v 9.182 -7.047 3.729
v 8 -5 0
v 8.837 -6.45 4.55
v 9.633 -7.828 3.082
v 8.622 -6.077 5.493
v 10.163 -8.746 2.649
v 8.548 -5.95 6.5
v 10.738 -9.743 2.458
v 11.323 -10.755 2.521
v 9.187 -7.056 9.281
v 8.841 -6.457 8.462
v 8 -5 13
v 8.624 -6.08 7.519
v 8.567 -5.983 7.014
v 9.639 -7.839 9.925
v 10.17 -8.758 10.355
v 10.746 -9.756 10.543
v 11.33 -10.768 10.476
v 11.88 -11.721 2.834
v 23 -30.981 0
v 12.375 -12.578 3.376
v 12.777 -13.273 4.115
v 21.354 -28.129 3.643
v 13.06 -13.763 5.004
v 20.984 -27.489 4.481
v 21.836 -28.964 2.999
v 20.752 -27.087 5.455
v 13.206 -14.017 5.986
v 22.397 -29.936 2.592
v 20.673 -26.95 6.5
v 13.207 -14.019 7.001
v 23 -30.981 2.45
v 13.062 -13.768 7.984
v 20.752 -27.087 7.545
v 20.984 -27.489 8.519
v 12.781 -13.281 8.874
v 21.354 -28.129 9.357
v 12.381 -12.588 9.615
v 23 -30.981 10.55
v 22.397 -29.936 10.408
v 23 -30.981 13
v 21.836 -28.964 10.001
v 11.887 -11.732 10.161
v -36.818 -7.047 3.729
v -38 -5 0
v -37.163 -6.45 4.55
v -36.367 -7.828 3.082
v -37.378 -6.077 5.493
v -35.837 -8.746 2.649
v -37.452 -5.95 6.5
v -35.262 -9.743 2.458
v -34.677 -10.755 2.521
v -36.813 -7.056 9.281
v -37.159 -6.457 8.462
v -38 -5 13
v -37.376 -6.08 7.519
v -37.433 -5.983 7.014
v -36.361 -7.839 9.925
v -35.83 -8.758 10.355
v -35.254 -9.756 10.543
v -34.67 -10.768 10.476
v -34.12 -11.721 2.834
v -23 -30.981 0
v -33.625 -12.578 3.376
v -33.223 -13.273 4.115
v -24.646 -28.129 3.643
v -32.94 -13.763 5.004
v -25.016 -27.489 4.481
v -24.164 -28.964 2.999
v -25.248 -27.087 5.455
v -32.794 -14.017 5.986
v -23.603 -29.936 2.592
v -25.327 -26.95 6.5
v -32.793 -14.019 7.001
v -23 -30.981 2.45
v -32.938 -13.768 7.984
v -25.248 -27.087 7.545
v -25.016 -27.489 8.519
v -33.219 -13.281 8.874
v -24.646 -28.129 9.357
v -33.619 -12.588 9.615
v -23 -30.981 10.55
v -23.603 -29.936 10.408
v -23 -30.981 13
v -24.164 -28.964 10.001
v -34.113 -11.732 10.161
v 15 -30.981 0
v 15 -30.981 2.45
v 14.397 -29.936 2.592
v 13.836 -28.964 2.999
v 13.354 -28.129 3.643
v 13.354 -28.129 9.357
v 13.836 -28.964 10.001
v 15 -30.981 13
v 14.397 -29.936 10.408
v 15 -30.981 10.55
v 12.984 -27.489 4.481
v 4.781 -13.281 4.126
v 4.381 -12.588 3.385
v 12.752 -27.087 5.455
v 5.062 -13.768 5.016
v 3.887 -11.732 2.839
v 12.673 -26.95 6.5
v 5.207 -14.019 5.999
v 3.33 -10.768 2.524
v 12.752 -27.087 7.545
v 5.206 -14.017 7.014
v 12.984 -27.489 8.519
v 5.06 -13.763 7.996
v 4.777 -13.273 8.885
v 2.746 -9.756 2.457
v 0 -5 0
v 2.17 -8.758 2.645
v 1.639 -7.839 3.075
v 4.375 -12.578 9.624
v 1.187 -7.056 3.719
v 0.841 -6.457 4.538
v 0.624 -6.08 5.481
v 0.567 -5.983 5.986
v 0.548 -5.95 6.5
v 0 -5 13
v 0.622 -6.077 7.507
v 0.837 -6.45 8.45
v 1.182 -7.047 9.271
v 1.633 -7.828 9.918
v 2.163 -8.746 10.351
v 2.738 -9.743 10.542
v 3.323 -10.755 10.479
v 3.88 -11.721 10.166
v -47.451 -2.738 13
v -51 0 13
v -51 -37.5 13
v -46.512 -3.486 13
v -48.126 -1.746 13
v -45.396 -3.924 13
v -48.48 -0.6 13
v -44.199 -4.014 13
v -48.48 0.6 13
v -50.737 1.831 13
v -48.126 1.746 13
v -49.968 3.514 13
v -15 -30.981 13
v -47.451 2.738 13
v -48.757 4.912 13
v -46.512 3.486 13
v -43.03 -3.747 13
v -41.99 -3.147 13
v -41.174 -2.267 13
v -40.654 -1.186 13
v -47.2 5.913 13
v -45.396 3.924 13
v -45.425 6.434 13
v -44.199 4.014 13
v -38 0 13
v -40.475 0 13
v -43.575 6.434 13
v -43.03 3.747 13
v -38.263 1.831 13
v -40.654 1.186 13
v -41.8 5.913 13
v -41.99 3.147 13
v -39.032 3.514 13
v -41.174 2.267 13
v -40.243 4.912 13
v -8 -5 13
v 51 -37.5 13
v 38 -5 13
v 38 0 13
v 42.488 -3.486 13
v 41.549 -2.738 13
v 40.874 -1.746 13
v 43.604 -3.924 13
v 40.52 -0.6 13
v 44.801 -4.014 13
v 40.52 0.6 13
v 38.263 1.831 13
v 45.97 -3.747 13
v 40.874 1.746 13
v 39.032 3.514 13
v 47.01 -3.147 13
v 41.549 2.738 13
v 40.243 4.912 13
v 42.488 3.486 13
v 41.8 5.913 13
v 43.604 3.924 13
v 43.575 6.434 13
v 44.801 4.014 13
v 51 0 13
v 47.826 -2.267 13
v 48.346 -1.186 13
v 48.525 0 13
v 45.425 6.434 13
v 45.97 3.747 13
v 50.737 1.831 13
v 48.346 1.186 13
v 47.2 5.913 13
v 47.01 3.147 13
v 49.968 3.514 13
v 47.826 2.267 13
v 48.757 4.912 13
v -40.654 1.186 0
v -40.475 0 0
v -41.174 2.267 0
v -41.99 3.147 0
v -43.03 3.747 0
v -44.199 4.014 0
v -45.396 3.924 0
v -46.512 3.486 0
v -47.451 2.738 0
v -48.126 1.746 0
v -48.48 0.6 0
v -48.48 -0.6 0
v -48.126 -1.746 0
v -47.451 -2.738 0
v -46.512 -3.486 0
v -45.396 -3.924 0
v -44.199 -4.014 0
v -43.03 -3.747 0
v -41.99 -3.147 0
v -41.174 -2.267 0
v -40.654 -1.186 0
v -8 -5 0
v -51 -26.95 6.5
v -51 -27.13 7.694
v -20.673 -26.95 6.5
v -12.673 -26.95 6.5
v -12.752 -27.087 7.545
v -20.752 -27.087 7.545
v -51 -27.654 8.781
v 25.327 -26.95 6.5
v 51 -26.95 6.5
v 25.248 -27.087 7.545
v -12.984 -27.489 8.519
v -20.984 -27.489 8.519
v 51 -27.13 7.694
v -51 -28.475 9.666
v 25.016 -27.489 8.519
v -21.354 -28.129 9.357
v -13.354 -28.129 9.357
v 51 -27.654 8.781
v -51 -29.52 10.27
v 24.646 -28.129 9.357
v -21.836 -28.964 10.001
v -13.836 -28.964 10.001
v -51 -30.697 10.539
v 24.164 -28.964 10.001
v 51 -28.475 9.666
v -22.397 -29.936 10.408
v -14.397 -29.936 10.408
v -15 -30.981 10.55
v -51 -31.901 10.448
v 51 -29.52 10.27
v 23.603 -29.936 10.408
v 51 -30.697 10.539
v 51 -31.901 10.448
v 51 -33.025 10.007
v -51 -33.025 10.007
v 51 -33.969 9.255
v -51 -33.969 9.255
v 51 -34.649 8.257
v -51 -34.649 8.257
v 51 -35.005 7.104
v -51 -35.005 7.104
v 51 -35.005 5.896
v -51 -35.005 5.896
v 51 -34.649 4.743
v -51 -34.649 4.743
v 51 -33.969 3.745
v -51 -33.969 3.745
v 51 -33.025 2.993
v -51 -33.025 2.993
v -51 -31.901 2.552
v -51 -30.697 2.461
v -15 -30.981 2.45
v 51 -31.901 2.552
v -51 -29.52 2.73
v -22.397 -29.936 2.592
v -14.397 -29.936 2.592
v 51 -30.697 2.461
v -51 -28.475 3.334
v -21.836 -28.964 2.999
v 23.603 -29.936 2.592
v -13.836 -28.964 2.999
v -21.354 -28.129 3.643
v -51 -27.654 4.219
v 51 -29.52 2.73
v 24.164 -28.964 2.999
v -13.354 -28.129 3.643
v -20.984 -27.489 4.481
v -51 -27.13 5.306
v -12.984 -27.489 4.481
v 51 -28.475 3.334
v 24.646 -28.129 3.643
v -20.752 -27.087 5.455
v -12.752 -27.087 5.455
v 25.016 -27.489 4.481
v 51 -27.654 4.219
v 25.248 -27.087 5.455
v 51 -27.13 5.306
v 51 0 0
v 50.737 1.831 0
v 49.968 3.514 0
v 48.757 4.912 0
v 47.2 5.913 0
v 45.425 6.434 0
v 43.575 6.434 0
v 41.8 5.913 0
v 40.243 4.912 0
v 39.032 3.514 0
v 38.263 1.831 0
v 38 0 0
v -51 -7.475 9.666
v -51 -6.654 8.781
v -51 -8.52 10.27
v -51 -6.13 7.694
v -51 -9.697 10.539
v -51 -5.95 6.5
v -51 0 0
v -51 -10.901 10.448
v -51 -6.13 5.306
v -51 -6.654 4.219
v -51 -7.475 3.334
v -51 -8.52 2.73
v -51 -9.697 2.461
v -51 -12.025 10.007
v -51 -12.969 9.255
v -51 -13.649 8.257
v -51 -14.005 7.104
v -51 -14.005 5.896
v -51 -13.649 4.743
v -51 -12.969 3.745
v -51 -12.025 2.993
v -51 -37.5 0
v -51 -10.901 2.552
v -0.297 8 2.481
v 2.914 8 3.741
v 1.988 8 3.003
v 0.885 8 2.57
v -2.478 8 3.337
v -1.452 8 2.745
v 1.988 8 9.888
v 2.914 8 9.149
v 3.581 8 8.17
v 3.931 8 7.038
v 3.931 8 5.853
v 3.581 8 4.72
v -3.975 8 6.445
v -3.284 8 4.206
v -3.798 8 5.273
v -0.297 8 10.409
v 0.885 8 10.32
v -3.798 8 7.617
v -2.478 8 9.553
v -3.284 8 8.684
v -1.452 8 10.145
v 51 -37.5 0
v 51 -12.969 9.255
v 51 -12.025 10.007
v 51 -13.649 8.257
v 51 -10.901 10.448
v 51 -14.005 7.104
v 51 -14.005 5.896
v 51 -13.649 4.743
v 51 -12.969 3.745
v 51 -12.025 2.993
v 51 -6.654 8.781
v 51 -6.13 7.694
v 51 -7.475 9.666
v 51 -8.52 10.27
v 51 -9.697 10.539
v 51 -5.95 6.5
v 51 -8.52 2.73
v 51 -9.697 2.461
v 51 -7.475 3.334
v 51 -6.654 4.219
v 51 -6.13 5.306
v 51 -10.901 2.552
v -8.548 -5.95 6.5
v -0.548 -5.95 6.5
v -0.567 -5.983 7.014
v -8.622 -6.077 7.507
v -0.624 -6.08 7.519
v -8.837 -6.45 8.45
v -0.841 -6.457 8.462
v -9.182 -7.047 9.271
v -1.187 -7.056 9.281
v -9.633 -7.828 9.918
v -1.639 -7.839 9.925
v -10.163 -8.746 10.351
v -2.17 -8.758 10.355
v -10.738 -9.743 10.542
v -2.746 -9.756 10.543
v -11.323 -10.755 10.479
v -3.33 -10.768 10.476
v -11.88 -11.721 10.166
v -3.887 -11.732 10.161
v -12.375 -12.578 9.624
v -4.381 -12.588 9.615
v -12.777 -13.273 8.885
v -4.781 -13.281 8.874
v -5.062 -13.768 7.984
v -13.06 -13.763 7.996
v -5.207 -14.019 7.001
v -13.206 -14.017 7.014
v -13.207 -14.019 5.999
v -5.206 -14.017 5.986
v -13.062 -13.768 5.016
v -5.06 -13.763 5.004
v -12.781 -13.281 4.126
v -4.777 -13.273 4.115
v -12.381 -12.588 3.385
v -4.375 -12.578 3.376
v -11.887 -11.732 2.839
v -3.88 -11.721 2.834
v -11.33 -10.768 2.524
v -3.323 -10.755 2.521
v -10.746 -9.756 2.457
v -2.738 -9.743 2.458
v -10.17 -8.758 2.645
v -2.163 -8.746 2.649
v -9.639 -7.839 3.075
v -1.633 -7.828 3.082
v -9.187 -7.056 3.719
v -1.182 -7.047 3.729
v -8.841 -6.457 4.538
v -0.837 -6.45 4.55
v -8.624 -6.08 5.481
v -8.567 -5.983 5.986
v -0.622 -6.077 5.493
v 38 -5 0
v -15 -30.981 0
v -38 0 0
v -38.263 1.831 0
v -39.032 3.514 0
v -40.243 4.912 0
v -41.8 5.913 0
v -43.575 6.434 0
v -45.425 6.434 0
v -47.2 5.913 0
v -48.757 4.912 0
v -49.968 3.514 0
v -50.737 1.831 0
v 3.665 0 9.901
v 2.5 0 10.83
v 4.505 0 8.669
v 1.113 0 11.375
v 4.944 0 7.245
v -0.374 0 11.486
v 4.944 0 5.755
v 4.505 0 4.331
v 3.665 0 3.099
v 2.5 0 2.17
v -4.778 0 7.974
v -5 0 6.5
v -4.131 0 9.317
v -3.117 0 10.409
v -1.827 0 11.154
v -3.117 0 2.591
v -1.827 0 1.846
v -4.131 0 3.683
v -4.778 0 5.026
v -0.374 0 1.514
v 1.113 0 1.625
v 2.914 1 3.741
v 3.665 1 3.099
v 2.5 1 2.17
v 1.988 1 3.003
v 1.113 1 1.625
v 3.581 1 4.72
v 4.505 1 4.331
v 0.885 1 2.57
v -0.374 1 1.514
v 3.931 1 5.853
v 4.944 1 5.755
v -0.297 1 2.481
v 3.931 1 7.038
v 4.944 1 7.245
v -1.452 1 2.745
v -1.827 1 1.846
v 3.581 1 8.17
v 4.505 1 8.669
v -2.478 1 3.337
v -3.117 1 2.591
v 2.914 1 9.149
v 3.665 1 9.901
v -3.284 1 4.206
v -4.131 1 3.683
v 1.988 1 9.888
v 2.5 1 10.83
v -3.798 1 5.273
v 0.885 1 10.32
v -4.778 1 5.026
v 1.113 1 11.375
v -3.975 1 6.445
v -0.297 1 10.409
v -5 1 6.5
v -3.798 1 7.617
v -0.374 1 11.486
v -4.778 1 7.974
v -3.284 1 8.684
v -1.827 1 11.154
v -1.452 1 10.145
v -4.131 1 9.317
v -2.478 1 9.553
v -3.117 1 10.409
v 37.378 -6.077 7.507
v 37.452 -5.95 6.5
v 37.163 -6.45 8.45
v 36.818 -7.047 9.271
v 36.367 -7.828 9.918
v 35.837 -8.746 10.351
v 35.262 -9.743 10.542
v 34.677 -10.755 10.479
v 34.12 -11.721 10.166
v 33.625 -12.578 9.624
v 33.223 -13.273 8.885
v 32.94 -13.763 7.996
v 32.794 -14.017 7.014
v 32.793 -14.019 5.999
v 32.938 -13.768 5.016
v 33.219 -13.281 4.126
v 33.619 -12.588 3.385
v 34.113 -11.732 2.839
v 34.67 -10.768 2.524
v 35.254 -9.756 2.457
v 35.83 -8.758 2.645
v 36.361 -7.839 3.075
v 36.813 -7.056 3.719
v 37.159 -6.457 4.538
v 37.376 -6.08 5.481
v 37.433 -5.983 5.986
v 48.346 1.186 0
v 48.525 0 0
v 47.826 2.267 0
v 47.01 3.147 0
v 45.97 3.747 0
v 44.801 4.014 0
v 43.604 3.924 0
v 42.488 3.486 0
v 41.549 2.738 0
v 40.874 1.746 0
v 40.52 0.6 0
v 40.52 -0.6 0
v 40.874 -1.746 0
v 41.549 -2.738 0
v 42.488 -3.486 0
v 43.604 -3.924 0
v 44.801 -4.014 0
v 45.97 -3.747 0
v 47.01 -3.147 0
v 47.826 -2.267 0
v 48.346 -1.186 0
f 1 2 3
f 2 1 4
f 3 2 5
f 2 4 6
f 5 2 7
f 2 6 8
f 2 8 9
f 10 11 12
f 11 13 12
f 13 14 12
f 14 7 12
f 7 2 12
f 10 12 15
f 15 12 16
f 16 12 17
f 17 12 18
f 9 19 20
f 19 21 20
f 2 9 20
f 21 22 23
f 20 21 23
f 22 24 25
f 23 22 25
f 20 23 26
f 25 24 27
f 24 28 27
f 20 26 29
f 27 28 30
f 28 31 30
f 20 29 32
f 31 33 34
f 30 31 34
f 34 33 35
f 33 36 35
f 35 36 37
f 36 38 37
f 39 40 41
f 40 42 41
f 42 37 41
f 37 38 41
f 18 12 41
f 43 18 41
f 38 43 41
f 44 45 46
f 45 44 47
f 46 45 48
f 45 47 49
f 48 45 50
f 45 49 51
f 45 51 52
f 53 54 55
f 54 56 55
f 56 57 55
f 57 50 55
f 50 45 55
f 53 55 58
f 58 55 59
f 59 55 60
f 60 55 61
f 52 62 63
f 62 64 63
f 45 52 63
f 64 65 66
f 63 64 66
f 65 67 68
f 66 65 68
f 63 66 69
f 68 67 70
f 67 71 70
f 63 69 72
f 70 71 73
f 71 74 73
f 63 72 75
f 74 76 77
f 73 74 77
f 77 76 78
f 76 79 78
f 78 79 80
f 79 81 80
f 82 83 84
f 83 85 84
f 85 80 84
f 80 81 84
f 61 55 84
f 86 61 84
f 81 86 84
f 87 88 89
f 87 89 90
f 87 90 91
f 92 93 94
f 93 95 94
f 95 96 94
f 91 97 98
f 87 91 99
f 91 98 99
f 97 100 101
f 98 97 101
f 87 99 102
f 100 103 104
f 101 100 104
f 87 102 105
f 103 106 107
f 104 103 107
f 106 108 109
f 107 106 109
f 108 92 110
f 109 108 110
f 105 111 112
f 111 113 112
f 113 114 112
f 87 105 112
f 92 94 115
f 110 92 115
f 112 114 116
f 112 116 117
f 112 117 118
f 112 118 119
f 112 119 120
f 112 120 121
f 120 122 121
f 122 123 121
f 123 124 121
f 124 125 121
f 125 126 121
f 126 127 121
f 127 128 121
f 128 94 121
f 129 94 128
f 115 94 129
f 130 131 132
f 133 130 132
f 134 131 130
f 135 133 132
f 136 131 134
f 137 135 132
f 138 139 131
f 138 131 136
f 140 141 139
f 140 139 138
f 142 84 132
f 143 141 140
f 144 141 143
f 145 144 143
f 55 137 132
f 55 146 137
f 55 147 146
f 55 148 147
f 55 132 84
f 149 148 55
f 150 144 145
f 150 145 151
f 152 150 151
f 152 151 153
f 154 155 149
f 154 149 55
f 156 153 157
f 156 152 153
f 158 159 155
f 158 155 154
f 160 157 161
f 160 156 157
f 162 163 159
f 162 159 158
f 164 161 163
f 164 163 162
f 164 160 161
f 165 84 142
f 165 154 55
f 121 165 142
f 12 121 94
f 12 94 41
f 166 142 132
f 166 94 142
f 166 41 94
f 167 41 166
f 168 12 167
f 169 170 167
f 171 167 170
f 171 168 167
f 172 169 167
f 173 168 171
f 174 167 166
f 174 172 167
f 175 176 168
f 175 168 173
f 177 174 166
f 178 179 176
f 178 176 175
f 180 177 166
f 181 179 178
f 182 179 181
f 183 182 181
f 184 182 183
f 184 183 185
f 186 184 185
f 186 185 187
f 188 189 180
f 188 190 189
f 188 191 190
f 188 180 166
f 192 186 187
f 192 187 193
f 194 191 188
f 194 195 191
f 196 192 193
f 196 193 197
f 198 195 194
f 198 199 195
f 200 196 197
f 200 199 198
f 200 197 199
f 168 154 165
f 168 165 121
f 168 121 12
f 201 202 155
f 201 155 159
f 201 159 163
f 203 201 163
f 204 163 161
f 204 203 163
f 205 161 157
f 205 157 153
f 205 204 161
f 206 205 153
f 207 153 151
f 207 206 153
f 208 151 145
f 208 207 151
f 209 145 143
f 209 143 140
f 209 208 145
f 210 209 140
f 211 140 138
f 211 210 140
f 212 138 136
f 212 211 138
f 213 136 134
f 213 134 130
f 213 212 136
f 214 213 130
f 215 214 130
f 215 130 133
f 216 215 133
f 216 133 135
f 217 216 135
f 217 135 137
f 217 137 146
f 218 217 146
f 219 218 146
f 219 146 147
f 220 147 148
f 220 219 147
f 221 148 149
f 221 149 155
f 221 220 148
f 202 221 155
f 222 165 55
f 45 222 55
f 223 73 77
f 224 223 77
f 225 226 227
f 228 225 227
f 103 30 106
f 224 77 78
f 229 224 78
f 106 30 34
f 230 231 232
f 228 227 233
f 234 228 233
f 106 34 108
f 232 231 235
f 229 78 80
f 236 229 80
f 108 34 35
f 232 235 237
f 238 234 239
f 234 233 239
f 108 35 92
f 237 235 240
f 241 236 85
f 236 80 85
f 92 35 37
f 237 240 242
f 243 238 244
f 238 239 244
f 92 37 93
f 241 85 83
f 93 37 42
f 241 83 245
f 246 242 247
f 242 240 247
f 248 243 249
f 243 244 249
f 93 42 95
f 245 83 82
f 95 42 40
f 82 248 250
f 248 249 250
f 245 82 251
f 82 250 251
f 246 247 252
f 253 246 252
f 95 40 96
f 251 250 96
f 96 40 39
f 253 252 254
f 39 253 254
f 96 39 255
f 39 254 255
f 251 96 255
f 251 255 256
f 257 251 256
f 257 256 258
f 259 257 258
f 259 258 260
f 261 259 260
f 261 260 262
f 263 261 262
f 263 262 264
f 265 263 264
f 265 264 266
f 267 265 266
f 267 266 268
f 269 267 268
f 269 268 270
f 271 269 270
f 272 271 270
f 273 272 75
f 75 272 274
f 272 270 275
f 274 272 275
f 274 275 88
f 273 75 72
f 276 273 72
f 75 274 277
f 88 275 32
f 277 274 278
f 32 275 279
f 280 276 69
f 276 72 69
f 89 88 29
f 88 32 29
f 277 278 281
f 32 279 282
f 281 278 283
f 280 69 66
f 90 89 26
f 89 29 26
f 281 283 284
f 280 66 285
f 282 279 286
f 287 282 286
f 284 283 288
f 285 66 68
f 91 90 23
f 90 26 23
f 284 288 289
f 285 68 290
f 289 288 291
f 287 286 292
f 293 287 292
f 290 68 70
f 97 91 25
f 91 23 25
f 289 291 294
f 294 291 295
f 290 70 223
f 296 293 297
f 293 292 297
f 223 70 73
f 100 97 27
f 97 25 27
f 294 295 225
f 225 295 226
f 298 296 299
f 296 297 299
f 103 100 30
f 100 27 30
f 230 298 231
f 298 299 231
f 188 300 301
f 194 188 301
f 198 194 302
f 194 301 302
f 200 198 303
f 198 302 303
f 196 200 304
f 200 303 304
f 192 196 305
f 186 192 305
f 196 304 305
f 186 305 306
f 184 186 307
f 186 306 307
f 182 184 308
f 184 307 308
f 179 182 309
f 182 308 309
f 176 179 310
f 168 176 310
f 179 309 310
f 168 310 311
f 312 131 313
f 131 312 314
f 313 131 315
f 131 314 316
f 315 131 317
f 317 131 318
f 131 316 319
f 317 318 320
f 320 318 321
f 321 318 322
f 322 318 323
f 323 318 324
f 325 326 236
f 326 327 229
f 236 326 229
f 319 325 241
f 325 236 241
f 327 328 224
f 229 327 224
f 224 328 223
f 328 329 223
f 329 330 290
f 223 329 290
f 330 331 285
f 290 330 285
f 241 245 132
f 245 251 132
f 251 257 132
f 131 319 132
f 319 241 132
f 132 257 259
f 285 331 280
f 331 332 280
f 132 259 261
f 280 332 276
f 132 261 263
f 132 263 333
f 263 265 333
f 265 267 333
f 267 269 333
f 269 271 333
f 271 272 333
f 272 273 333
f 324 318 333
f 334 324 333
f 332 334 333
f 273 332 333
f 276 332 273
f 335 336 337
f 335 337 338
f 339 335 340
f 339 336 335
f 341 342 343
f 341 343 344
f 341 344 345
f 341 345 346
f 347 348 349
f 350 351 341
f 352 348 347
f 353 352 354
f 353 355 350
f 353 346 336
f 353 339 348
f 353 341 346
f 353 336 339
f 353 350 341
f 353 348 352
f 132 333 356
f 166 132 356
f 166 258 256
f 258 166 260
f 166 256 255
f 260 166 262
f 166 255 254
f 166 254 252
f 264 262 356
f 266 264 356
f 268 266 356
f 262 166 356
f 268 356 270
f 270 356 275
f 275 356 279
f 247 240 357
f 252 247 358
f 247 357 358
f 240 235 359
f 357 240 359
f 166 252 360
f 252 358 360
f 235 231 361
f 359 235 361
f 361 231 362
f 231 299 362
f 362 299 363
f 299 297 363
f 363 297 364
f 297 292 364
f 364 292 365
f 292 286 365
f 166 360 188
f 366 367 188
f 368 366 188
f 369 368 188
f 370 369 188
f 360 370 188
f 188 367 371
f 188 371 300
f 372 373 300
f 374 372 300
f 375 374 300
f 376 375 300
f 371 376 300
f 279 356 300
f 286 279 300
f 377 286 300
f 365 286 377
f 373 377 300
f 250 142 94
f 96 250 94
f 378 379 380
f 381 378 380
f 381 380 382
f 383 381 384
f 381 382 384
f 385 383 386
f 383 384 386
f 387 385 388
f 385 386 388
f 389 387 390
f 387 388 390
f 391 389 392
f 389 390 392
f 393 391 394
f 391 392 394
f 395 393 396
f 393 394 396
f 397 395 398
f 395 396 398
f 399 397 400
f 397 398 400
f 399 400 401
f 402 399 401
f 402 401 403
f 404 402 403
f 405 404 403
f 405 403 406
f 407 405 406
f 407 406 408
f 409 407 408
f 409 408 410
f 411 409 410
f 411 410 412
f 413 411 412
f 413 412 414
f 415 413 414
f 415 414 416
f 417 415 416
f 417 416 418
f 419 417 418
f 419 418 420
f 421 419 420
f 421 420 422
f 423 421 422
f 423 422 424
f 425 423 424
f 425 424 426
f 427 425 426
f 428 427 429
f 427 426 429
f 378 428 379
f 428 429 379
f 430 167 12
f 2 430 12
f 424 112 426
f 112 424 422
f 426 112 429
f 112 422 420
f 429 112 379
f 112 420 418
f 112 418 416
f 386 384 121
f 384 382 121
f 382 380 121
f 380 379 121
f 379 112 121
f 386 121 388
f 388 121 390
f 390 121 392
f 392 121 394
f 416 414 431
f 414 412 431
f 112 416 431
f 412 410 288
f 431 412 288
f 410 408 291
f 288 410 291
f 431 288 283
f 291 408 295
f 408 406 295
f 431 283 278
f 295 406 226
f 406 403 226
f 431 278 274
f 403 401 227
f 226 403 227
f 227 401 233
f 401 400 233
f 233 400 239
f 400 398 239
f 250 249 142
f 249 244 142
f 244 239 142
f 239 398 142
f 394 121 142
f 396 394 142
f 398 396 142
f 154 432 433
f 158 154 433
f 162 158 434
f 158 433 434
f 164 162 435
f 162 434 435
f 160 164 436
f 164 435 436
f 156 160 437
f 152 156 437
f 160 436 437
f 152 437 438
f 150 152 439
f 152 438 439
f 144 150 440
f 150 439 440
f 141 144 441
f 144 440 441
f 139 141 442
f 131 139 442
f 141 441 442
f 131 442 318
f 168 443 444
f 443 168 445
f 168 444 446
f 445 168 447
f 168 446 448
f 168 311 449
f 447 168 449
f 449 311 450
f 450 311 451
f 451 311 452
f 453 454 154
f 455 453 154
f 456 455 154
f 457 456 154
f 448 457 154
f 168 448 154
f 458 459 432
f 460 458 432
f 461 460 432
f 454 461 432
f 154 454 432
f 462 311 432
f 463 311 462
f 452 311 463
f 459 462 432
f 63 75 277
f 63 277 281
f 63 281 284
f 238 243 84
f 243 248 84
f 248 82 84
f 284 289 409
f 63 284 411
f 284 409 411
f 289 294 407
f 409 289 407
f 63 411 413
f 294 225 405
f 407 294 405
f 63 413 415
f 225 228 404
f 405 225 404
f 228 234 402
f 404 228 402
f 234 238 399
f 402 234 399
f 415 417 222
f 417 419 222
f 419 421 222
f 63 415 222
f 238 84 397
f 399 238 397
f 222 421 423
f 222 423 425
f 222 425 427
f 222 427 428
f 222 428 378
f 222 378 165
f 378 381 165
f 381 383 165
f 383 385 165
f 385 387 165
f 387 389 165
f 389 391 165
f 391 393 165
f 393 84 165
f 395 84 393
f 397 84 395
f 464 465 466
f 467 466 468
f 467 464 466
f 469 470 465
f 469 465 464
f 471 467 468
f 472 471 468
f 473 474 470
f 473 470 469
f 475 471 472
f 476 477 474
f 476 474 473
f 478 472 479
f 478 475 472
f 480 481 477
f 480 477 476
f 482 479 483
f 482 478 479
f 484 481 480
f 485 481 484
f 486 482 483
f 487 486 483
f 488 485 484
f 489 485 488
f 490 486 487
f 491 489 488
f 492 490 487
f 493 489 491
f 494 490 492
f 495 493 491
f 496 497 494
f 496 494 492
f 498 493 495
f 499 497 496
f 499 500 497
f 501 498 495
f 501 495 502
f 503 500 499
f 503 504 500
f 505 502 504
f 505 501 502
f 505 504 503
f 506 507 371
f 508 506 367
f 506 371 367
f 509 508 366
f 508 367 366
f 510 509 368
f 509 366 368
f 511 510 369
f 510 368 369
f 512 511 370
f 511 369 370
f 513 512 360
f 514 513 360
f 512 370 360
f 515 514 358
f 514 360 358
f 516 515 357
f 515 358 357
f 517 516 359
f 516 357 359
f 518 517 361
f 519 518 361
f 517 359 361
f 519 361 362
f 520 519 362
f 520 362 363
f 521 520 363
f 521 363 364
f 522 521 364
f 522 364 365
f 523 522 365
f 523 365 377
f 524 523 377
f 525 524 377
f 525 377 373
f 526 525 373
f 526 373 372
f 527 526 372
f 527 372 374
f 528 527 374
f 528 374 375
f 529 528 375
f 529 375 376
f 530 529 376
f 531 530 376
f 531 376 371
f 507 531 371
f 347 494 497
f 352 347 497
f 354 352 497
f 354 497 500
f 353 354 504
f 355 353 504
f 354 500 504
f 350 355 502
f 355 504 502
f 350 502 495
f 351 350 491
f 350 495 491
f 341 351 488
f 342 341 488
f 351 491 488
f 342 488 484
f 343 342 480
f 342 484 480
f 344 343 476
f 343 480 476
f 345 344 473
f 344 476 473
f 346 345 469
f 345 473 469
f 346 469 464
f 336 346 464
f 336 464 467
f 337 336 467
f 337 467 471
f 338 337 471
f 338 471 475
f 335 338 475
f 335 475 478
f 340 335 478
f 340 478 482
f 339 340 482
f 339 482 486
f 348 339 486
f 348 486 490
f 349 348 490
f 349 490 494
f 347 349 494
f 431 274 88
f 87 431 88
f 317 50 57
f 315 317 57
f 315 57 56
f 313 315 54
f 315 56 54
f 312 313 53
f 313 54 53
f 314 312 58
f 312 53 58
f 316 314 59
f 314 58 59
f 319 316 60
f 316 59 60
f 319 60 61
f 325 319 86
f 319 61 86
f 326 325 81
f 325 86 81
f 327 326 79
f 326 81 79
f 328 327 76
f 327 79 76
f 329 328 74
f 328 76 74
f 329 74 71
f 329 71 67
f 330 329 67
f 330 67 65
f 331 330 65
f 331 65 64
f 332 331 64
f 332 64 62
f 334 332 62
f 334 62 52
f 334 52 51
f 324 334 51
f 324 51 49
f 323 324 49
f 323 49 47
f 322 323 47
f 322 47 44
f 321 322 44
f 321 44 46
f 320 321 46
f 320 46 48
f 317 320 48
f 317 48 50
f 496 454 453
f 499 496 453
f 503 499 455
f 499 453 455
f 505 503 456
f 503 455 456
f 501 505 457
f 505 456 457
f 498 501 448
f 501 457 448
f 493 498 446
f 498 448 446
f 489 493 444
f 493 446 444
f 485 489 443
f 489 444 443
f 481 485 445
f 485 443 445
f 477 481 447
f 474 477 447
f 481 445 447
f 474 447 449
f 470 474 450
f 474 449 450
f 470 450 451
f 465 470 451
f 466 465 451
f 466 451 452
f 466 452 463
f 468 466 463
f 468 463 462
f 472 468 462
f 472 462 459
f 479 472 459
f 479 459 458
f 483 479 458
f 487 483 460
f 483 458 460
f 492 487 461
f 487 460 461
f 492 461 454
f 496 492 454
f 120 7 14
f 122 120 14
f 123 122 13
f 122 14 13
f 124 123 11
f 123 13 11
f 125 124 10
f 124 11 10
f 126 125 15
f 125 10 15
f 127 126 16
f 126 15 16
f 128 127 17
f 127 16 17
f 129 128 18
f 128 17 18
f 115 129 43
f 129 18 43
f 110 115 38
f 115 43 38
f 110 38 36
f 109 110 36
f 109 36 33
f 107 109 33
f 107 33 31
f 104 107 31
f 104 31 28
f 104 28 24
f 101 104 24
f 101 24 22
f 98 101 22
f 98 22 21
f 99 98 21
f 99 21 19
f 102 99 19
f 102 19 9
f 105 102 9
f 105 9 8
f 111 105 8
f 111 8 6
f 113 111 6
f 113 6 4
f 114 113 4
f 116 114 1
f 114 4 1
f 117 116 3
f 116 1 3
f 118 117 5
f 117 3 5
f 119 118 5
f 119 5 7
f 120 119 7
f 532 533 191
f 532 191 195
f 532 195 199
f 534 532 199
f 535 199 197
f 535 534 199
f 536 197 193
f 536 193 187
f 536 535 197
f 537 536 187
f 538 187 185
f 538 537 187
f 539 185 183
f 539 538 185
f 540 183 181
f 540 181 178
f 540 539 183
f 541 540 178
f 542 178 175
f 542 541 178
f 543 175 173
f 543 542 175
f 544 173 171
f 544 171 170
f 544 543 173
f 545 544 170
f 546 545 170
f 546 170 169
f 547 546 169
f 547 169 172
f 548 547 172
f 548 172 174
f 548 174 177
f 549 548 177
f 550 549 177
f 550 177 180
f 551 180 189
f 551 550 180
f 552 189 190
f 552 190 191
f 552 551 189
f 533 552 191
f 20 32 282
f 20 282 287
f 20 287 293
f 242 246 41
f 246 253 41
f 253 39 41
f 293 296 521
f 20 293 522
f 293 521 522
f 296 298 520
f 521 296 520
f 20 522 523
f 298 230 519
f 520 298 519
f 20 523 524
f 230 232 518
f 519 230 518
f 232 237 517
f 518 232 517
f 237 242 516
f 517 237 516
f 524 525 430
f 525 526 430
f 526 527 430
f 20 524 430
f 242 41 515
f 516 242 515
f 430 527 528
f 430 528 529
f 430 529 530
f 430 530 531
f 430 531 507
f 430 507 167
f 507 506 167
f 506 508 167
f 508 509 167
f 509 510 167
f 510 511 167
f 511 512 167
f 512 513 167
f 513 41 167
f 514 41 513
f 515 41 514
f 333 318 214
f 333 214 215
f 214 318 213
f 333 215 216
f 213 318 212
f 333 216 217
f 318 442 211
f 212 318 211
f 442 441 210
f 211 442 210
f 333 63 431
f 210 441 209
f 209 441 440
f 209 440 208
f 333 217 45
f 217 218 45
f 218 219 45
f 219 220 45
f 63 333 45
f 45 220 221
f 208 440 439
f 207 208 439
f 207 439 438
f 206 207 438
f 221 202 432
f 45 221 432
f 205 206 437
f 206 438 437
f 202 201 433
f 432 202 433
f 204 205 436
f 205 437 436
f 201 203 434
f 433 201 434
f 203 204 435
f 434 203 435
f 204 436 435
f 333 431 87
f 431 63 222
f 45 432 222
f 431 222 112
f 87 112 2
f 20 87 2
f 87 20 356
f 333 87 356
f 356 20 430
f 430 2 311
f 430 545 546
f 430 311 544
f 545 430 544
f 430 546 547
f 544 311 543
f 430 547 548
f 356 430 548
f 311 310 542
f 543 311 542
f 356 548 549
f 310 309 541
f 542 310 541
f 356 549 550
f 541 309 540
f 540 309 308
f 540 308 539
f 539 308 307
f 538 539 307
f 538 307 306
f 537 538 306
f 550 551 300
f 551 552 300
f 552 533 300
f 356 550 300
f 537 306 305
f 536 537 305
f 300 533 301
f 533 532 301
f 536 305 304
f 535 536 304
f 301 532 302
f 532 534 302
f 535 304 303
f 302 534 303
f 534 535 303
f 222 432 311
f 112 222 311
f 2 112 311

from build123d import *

# Parameters (mm, degrees)
F0_R     = 4.025
F1_DEPTH = 13
F2_R     = 4.05
F3_DEPTH = 200
F5_DEPTH = 25
F6_R     = 5
F6_R_2   = 3.975
F7_DEPTH = 1
F8_DEPTH = 8


with BuildPart() as f1:
    # F0 (on Top) → F1 (new body)
    with BuildSketch(Plane.XY):
        with BuildLine():
            Line((38, 0), (0, 0))
            Line((0, 0), (-38, 0))
            ThreePointArc((-38, 0), (-44.5, 6.5), (-51, 0))
            Line((-51, 0), (-51, -37.5))
            Line((-51, -37.5), (0, -37.5))
            Line((0, -37.5), (51, -37.5))
            Line((51, -37.5), (51, 0))
            ThreePointArc((51, 0), (44.5, 6.5), (38, 0))
        make_face()
        with Locations((-44.5, 0)):
            Circle(F0_R, mode=Mode.SUBTRACT)
        with Locations((44.5, 0)):
            Circle(F0_R, mode=Mode.SUBTRACT)
    extrude(amount=F1_DEPTH)

    # F2 (on face) → F3 (cut)
    with BuildSketch(Plane.YZ.offset(51)):
        with Locations((-10, 6.5)):
            Circle(F2_R)
        with Locations((-31, 6.5)):
            Circle(F2_R)
    extrude(amount=-F3_DEPTH, mode=Mode.SUBTRACT)

    # F4 (on face) → F5 (cut)
    with BuildSketch(Plane.XY.offset(13)):
        Polygon((-23, -30.980762), (-8, -5), (-38, -5), align=None)
        Polygon((15, -30.980762), (0, -5), (-15, -30.980762), align=None)
        Polygon((23, -30.980762), (38, -5), (8, -5), align=None)
    extrude(amount=-F5_DEPTH, mode=Mode.SUBTRACT)

    # F6 (on face) → F7 (join)
    with BuildSketch(Plane(origin=(0, 0, 0), x_dir=(-1, 0, 0), z_dir=(0, 1, 0))):
        with Locations((0, 6.5)):
            Circle(F6_R)
        with Locations((0, 6.445146)):
            Circle(F6_R_2, mode=Mode.SUBTRACT)
    extrude(amount=F7_DEPTH)

    # F6 (on face) → F8 (join)
    with BuildSketch(Plane(origin=(0, 0, 0), x_dir=(-1, 0, 0), z_dir=(0, 1, 0))):
        with Locations((0, 6.445146)):
            Circle(F6_R_2)
    extrude(amount=F8_DEPTH)


solid = f1.part
